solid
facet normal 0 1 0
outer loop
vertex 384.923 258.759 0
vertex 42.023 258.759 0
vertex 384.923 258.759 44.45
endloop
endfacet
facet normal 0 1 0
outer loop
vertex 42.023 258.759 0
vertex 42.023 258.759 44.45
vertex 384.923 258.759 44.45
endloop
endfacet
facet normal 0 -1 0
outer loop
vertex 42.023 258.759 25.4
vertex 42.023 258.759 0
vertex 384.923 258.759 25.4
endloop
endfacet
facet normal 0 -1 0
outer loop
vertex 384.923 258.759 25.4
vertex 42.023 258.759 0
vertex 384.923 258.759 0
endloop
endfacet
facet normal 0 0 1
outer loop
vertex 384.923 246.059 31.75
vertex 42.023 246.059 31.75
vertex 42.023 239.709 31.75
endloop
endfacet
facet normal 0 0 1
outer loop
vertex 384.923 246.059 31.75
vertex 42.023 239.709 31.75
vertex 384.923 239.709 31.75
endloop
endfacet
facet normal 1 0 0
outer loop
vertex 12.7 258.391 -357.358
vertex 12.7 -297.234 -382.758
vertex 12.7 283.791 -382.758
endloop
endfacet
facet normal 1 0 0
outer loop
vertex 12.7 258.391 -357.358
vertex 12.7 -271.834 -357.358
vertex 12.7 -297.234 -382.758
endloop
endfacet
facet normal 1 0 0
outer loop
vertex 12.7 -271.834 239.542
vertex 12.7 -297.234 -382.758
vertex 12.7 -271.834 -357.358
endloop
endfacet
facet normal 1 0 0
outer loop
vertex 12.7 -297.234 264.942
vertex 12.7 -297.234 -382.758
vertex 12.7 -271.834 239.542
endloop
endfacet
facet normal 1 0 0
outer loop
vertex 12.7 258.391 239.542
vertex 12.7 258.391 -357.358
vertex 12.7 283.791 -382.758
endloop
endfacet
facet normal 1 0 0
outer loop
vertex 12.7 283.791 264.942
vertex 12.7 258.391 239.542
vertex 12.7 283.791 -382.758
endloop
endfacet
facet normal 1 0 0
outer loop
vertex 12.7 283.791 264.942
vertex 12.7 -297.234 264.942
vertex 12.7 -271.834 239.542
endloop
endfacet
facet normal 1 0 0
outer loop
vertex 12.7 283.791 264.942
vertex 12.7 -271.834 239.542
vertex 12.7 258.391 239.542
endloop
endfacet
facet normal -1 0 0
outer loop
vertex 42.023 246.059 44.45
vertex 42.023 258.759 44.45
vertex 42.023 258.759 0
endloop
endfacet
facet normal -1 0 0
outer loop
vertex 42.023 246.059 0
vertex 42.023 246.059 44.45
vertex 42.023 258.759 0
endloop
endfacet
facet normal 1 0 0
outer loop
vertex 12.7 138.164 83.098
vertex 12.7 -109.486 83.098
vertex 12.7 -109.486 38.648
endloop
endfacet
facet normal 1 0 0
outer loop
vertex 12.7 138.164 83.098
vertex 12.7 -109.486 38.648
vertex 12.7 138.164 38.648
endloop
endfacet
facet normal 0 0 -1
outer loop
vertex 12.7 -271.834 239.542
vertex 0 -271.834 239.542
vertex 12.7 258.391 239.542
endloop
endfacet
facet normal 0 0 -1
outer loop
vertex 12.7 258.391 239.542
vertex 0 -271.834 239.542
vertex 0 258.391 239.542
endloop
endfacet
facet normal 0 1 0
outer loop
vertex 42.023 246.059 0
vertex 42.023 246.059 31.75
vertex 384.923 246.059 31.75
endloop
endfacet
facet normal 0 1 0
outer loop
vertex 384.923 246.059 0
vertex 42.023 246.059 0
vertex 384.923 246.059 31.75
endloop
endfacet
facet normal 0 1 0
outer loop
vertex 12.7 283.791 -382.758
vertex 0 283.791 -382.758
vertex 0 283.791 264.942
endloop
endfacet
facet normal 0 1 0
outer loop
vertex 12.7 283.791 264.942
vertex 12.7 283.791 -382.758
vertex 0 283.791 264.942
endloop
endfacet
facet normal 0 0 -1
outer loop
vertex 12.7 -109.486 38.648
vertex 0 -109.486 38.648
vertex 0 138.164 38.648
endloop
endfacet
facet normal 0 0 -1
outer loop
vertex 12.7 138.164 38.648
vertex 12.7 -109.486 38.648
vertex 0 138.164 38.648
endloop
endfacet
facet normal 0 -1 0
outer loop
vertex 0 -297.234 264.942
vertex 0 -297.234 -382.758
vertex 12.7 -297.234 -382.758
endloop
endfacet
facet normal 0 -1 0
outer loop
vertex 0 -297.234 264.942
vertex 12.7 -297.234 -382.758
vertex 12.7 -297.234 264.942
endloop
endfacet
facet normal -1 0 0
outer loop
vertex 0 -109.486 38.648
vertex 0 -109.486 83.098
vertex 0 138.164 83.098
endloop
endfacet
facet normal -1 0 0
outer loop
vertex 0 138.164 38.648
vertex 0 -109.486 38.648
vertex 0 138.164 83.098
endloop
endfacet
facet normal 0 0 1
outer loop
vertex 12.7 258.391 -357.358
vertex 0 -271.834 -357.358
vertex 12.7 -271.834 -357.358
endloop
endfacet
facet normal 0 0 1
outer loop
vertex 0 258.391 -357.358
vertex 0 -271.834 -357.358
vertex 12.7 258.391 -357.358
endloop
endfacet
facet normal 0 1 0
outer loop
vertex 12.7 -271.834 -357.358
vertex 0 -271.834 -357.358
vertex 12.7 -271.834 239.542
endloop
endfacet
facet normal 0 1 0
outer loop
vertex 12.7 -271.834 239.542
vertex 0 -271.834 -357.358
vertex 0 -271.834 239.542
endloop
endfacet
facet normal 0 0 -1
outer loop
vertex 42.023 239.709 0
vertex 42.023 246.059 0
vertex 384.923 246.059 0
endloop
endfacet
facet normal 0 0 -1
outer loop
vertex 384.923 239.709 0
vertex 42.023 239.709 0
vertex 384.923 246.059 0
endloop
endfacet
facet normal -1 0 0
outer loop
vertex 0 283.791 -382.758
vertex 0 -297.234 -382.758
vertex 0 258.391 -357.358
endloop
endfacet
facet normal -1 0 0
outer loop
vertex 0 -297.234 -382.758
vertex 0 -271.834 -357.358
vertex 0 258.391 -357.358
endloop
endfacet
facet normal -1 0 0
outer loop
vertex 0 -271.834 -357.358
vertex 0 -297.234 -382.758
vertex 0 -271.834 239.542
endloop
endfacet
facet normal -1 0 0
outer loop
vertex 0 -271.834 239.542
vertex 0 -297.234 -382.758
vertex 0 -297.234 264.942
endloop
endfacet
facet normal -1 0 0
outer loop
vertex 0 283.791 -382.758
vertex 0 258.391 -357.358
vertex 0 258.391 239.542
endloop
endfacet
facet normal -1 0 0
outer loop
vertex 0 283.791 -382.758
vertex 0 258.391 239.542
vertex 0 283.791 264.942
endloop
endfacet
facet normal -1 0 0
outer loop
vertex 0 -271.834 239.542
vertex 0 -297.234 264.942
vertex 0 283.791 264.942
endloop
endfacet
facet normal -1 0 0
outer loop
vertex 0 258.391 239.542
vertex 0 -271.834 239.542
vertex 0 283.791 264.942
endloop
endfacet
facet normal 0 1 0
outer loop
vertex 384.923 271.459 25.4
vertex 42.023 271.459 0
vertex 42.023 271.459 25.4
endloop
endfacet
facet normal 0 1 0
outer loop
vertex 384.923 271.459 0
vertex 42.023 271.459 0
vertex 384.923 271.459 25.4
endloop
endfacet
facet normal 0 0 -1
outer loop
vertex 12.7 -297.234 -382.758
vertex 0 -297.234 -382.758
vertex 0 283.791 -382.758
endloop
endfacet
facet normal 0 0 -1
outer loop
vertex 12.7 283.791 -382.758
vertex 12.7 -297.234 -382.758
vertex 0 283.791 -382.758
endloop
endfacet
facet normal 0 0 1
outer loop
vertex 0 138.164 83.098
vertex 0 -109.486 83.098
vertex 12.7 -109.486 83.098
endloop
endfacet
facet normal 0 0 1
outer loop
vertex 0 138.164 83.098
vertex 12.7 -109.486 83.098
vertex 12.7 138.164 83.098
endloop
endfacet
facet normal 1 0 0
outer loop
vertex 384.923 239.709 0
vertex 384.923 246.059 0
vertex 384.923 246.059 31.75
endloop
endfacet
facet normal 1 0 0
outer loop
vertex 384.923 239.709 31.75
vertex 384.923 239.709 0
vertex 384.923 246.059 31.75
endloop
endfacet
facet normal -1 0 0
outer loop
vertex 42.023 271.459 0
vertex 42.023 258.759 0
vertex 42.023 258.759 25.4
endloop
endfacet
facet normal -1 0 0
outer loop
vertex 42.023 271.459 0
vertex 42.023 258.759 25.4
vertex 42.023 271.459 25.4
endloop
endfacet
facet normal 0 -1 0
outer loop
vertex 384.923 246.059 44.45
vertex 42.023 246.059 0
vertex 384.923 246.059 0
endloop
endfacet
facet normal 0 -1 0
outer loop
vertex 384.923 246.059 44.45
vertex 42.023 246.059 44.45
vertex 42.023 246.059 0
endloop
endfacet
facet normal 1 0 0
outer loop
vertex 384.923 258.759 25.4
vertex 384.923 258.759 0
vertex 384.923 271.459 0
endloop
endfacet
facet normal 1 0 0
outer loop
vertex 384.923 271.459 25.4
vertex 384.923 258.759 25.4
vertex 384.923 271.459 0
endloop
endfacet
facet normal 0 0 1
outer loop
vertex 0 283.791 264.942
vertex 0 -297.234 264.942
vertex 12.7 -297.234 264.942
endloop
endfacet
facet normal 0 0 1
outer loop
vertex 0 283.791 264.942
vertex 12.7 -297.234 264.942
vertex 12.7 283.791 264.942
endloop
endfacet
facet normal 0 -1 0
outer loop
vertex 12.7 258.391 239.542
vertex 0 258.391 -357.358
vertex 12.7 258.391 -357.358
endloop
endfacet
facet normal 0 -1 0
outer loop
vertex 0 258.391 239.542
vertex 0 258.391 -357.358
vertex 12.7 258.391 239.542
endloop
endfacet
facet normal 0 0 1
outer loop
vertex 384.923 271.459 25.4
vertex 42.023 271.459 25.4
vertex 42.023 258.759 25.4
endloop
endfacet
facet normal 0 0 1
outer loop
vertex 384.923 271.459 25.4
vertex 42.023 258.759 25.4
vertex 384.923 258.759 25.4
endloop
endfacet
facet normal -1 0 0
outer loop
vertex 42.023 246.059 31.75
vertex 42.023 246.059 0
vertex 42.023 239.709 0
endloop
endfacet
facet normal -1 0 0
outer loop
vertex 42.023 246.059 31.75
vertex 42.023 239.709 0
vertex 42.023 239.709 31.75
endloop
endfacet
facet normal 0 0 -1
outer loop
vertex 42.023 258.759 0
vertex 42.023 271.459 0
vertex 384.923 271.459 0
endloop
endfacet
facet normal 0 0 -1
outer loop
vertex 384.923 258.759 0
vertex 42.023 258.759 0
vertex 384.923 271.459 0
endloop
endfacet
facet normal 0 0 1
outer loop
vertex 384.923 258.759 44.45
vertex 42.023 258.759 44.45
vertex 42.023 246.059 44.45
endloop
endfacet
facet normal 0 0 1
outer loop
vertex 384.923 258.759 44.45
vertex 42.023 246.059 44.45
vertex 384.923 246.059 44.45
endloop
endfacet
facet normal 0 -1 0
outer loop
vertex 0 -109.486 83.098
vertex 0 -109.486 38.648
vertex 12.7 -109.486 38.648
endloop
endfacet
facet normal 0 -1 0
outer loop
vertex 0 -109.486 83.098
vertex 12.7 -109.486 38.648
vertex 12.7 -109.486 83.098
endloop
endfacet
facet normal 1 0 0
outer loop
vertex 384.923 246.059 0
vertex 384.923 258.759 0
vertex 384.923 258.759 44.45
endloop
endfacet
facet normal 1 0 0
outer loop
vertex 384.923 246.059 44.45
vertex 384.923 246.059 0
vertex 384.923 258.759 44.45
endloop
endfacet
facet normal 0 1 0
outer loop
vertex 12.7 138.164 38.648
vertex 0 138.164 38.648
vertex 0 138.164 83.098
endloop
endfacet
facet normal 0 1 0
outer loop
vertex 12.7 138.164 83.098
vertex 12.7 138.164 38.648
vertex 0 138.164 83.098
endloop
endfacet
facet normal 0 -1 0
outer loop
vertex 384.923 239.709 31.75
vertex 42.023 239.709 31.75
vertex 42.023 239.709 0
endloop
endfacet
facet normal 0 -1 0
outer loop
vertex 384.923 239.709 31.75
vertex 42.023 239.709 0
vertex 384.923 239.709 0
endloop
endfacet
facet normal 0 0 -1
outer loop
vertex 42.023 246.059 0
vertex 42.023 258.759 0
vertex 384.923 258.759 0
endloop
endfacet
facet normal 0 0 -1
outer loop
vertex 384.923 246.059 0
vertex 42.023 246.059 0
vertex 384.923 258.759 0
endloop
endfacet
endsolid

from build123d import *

# Parameters (mm, degrees)
F0_W     = 581.025
F0_H     = 647.7
F0_W_2   = 530.225
F0_H_2   = 596.9
F1_DEPTH = 12.7
F2_W     = 342.9
F2_H     = 12.7
F3_DEPTH = 25.4
F4_W     = 342.9
F4_H     = 25.4
F4_H_2   = 19.05
F5_DEPTH = 12.7
F6_W     = 342.9
F6_H     = 31.75
F7_DEPTH = 6.35
F8_W     = 247.65
F8_H     = 44.45
F9_DEPTH = 12.7


with BuildPart() as f1:
    # F0 (on Right) → F1 (new body)
    with BuildSketch(Plane.YZ):
        with Locations((-6.72147, -58.908128)):
            Rectangle(F0_W, F0_H)
        with Locations((-6.72147, -58.908128)):
            Rectangle(F0_W_2, F0_H_2, mode=Mode.SUBTRACT)
    extrude(amount=F1_DEPTH)


with BuildPart() as f3:
    # F2 (on Top) → F3 (new body)
    with BuildSketch(Plane.XY):
        with Locations((213.473471, 265.108508)):
            Rectangle(F2_W, F2_H)
    extrude(amount=F3_DEPTH)


with BuildPart() as f5:
    # F4 (on face) → F5 (new body)
    with BuildSketch(Plane.XZ.offset(-258.758508)):
        with Locations((213.473471, 12.7)):
            Rectangle(F4_W, F4_H)
        with Locations((213.473471, 34.925)):
            Rectangle(F4_W, F4_H_2)
    extrude(amount=F5_DEPTH)


with BuildPart() as f7:
    # F6 (on face) → F7 (new body)
    with BuildSketch(Plane.XZ.offset(-246.058508)):
        with Locations((213.473471, 15.875)):
            Rectangle(F6_W, F6_H)
    extrude(amount=F7_DEPTH)


with BuildPart() as f9:
    # F8 (on Right) → F9 (new body)
    with BuildSketch(Plane.YZ):
        with Locations((14.339412, 60.873013)):
            Rectangle(F8_W, F8_H)
    extrude(amount=F9_DEPTH)


solid = Compound([f1.part, f3.part, f5.part, f7.part, f9.part])
